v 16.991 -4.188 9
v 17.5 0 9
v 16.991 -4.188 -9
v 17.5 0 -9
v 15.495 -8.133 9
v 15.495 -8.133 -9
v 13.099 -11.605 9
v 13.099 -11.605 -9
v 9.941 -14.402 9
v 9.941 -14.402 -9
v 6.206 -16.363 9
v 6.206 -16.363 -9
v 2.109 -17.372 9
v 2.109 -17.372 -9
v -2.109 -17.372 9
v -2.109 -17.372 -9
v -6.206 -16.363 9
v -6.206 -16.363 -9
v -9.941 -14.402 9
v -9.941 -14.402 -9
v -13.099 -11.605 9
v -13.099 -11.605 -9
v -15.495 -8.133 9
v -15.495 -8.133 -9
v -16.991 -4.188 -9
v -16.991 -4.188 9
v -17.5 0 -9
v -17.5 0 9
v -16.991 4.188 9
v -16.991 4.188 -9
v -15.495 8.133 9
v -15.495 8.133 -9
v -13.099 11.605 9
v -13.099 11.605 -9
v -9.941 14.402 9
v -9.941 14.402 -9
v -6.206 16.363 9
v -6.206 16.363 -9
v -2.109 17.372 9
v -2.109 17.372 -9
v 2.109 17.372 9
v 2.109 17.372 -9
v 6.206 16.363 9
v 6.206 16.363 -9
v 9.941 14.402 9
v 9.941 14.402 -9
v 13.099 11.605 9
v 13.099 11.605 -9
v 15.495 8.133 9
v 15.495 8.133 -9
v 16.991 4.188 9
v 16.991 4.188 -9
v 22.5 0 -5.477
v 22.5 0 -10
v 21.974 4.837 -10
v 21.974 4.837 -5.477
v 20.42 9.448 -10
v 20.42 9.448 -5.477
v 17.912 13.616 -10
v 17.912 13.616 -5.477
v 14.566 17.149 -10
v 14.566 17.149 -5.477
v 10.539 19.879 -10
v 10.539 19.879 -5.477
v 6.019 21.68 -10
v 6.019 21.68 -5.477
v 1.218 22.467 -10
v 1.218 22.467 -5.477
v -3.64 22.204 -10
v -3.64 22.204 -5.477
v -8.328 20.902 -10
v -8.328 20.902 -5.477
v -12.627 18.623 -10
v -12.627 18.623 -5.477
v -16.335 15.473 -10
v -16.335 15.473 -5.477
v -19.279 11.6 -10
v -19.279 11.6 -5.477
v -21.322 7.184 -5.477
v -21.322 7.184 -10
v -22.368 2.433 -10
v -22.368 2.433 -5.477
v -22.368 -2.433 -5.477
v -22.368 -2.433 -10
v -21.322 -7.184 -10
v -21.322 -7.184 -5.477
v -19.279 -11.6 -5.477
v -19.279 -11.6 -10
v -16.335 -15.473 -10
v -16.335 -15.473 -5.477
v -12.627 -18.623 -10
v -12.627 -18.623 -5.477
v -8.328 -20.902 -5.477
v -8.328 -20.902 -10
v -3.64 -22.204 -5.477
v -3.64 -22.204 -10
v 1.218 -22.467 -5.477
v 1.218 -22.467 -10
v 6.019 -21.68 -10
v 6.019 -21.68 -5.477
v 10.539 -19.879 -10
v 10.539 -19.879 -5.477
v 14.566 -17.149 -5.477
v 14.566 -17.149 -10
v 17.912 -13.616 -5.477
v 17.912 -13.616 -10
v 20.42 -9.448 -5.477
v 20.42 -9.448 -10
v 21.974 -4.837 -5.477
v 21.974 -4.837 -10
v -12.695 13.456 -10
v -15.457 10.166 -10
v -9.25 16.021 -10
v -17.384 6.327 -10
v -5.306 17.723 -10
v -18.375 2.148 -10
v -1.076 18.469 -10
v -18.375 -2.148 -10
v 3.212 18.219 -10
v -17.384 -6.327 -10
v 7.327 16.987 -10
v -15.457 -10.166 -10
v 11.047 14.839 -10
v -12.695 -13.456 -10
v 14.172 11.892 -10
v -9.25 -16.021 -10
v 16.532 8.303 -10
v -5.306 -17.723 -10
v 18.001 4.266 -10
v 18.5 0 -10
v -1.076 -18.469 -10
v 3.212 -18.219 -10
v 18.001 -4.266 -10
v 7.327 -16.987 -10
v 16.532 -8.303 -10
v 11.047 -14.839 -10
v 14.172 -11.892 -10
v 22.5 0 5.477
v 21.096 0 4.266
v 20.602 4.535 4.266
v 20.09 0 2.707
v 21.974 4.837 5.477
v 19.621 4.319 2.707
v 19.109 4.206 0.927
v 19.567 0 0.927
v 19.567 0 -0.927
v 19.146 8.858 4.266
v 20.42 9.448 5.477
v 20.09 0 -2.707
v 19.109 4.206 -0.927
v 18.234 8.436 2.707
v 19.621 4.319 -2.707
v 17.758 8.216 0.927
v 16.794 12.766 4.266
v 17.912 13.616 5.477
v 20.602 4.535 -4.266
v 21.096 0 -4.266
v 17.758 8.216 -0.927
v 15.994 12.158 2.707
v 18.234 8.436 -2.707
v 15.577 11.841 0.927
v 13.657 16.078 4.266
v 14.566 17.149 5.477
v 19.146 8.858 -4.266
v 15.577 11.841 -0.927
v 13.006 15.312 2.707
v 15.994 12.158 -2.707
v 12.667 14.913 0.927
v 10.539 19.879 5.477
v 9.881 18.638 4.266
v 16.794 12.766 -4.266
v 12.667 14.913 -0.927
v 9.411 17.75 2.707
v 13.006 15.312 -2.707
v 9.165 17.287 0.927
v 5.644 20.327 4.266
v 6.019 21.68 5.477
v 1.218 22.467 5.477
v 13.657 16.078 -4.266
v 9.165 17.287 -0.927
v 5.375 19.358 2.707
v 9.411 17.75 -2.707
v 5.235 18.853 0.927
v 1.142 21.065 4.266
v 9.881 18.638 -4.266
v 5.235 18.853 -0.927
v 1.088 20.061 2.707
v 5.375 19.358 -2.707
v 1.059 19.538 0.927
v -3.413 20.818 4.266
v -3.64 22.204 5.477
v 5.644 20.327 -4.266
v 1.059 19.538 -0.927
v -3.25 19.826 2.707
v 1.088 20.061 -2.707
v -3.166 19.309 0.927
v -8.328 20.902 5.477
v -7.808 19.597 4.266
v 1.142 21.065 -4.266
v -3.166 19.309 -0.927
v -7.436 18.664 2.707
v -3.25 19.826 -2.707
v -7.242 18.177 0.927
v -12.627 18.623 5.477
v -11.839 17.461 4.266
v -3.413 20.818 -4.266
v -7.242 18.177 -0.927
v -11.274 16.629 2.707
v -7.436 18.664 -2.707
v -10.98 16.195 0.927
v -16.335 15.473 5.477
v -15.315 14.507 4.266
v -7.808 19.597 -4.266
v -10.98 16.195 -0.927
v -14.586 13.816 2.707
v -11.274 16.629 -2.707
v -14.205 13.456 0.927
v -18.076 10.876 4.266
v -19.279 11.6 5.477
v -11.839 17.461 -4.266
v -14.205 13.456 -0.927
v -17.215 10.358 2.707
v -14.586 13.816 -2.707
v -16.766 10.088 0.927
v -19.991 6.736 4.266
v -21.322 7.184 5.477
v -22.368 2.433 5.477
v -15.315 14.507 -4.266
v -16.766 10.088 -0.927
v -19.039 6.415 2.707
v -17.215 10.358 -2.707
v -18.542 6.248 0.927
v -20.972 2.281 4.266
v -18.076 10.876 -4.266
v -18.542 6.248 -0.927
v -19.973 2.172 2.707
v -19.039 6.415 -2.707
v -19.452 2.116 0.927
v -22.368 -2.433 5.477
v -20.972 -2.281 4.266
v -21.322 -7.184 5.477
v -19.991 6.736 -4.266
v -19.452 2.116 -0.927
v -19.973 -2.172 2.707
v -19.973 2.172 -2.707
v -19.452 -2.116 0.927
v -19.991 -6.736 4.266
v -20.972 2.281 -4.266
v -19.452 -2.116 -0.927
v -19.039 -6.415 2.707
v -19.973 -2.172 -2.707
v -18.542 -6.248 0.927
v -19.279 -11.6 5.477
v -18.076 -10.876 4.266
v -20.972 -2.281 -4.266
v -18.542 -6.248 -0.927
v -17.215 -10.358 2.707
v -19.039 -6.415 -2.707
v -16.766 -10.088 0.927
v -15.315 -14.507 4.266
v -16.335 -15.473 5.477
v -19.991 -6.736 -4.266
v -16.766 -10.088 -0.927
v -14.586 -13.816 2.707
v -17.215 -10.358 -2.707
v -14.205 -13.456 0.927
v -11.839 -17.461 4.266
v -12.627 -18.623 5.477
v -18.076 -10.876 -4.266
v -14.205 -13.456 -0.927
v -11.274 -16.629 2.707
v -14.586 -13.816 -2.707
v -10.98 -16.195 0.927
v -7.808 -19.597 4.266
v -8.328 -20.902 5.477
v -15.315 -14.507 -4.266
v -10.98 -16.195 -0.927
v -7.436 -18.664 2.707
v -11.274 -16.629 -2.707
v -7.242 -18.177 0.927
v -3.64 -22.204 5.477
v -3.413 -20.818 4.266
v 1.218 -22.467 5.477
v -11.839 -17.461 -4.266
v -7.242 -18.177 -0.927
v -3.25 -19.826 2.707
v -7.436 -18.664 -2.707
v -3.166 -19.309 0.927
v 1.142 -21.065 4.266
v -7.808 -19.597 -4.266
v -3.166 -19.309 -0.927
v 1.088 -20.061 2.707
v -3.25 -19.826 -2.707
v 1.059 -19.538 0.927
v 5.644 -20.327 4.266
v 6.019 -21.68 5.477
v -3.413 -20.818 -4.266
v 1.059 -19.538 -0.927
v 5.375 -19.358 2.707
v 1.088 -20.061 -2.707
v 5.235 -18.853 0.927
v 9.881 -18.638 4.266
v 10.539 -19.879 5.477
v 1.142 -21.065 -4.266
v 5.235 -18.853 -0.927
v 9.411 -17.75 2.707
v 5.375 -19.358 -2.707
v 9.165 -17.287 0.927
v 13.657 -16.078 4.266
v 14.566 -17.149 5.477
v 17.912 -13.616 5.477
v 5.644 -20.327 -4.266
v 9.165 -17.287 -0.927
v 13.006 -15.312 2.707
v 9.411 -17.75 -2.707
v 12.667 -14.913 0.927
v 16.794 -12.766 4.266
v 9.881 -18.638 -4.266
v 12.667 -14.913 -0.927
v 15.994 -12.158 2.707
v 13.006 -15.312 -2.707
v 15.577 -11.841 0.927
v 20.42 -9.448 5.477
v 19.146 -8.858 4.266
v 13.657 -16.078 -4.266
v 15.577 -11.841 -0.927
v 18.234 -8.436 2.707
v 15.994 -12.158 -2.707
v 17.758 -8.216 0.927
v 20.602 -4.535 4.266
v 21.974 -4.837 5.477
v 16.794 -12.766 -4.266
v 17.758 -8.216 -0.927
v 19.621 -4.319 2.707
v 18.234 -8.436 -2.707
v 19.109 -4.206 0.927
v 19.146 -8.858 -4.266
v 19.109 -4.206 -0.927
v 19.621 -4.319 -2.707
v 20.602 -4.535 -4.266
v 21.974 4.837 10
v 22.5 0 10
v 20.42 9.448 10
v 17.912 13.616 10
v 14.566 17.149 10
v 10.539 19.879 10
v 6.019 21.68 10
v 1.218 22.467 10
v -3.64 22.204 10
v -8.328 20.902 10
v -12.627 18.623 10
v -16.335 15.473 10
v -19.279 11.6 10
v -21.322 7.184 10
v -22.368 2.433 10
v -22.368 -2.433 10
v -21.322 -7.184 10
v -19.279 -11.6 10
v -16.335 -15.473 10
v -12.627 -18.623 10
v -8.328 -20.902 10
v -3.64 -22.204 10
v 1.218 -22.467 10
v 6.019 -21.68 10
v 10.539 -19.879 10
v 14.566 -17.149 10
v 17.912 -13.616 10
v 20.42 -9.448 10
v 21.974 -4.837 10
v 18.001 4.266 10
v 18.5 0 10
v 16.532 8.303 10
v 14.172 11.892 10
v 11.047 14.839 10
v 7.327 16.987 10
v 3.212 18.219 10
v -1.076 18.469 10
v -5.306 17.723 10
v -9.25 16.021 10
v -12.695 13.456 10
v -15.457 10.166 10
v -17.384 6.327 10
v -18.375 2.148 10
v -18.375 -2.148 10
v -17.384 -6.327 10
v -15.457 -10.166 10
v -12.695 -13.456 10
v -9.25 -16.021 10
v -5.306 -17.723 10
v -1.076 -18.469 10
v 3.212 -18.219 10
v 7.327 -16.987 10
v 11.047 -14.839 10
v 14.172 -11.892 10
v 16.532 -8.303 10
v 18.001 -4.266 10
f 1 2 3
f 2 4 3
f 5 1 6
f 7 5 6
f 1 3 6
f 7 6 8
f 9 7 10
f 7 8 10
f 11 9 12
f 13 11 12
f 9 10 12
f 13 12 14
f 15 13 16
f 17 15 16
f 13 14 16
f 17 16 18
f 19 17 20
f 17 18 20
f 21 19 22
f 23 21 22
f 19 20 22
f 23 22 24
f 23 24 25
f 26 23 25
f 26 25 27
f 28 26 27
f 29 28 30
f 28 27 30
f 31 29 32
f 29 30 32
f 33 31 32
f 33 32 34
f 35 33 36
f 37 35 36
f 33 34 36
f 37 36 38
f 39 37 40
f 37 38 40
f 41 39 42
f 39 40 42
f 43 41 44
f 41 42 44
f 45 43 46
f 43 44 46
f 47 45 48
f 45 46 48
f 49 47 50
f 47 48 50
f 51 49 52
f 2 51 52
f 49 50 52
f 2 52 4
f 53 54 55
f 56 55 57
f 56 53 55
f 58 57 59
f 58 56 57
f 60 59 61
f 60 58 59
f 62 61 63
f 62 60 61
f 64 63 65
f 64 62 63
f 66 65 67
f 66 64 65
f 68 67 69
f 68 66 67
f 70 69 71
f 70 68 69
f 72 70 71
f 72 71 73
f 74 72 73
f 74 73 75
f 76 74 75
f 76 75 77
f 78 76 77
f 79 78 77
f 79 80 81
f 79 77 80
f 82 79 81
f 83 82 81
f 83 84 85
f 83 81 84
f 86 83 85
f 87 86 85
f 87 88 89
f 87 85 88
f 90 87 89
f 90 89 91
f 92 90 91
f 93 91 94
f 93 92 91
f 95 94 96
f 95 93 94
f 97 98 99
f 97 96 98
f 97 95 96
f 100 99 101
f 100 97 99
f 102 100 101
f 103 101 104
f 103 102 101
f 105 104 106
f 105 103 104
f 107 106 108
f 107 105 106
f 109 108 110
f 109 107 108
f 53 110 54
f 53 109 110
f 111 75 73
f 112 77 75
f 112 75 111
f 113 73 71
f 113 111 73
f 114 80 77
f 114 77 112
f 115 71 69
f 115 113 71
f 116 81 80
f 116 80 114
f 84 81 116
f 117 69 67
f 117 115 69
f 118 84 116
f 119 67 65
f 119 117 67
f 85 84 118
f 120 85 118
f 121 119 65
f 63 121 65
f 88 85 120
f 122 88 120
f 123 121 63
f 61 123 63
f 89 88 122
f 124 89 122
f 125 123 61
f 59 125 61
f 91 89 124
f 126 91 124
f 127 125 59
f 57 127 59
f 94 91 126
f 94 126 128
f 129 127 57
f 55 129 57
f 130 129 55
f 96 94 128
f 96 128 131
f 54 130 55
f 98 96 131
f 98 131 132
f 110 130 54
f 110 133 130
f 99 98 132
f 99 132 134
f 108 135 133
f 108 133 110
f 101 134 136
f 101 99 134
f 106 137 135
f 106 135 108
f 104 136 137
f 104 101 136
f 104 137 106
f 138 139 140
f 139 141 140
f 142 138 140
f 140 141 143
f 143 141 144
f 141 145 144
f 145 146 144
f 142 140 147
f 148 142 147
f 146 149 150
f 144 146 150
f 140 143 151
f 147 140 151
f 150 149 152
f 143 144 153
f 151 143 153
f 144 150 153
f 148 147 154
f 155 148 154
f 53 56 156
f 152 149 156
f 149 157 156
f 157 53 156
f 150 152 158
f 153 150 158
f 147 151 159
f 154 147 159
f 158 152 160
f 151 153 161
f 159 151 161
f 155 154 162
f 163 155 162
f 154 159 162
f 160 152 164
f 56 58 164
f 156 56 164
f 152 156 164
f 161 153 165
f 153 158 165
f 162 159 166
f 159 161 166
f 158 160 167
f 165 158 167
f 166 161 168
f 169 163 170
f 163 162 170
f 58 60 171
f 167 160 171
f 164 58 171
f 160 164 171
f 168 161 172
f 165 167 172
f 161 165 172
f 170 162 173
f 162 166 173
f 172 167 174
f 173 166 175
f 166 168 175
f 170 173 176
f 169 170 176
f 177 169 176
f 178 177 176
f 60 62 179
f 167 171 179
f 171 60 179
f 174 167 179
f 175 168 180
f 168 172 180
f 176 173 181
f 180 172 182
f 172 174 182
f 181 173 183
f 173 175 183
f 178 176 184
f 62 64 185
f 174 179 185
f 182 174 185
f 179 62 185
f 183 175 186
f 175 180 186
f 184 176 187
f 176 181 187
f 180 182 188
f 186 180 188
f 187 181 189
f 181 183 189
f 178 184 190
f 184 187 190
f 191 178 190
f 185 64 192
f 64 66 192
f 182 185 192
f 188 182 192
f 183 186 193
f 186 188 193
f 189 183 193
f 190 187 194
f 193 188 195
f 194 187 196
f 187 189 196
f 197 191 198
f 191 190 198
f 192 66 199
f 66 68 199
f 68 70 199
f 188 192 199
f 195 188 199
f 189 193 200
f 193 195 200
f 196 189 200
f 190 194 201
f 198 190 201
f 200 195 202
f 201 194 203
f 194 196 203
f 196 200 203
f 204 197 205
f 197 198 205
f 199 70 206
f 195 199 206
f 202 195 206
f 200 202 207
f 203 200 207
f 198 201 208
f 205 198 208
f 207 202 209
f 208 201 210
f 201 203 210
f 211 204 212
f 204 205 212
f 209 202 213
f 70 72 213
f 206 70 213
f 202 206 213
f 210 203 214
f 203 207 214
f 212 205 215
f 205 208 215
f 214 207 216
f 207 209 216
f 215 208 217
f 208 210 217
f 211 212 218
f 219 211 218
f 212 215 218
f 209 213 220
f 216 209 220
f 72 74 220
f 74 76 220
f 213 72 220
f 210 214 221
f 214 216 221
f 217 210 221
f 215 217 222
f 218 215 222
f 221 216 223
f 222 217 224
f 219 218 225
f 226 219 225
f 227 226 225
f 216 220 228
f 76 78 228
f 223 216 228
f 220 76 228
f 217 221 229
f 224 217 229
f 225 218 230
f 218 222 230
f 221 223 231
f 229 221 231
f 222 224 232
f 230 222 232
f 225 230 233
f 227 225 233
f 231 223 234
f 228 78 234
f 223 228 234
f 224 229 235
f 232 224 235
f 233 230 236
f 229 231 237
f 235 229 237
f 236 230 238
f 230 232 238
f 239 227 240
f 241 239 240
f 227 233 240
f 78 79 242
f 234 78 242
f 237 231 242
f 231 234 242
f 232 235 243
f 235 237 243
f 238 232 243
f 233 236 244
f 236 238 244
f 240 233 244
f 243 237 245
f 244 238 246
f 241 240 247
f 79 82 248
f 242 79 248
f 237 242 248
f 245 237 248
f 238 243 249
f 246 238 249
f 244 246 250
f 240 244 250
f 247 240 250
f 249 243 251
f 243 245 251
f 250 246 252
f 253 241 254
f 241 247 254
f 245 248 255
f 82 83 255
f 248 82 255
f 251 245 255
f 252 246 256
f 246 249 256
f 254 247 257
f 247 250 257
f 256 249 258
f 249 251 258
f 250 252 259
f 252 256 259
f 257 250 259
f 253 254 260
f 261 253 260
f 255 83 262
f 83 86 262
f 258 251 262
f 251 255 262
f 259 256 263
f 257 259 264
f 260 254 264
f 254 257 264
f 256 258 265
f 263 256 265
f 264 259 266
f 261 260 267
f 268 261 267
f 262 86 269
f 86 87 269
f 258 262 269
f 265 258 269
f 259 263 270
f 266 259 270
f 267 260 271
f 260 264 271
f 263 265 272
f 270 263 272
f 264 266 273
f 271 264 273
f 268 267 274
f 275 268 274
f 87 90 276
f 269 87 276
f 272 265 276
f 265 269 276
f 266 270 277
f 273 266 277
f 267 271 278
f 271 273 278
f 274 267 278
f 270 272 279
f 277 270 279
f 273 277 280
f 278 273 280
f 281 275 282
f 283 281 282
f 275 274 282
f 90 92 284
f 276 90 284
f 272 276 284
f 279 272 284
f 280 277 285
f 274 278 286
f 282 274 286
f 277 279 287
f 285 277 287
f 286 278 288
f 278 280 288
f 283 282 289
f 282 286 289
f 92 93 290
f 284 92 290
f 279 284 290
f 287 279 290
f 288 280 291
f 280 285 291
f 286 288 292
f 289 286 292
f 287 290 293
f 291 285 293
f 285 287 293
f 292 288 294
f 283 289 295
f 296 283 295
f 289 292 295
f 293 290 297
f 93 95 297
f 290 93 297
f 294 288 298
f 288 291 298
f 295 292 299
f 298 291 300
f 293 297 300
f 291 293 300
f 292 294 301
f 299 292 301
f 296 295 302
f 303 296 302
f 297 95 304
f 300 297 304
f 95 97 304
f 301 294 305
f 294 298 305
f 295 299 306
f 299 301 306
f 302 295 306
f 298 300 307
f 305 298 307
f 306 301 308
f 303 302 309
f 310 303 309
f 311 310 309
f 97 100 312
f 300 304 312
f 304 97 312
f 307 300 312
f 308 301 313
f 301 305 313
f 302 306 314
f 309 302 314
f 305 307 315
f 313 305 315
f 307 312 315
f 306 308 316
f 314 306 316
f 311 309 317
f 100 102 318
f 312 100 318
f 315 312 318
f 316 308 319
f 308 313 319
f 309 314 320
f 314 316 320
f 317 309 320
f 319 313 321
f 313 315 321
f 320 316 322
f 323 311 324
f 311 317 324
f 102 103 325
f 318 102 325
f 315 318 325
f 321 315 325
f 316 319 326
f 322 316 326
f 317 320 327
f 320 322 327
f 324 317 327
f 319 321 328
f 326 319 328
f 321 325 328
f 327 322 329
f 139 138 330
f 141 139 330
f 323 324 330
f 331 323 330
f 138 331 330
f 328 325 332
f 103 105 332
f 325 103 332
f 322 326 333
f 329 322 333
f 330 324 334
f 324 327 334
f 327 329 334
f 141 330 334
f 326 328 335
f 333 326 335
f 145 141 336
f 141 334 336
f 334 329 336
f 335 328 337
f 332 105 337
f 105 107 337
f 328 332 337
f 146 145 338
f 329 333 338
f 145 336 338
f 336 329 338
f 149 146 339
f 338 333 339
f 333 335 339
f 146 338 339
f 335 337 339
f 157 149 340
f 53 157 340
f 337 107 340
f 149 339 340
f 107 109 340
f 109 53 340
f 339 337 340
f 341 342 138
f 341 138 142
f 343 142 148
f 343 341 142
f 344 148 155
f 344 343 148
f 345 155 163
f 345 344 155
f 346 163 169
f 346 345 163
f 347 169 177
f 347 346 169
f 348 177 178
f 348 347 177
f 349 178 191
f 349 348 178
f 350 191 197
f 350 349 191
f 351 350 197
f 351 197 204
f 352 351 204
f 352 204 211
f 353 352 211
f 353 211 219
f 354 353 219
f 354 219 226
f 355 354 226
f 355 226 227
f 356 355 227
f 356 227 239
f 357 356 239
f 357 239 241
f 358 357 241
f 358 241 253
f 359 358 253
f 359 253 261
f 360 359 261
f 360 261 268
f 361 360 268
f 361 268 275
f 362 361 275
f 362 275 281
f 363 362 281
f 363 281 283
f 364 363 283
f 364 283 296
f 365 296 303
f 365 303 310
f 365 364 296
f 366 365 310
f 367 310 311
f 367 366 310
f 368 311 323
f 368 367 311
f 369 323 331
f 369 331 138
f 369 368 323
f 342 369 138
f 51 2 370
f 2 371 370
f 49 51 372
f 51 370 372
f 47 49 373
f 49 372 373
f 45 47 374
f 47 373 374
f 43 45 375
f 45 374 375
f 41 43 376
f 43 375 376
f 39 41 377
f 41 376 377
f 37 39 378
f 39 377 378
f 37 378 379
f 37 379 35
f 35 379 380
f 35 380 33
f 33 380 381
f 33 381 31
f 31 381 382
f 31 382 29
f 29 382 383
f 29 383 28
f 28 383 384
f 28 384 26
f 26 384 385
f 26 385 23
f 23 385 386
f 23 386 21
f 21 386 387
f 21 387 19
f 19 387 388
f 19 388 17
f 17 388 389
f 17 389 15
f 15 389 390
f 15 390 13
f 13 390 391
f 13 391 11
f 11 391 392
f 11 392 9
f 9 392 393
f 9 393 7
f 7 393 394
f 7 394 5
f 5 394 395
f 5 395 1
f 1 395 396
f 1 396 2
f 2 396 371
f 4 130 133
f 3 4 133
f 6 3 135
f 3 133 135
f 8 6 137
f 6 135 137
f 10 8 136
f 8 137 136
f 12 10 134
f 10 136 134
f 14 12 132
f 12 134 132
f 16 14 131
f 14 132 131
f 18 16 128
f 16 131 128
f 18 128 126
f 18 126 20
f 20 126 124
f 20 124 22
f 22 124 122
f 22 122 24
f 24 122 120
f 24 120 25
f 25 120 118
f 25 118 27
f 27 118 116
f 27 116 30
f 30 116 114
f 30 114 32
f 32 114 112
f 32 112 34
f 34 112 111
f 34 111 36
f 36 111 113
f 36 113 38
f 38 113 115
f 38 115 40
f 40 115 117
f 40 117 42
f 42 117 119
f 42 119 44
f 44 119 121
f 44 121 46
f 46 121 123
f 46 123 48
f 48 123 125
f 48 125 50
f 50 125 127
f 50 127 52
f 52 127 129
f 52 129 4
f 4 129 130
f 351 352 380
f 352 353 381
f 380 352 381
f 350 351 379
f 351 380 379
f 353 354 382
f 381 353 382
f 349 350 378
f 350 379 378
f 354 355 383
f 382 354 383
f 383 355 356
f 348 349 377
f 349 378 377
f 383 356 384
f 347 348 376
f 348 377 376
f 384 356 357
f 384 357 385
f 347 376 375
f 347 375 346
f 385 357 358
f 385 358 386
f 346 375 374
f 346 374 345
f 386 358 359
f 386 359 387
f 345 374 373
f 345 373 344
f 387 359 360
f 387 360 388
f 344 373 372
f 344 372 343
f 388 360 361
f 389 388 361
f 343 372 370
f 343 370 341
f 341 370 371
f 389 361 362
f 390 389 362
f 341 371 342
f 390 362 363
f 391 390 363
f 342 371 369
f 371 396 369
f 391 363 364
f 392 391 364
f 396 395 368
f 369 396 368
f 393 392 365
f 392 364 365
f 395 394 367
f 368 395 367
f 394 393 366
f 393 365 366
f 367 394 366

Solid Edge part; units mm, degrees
sketch "Sketch1" plane through (0, 0, 0) normal (0, -1, 0) x (1, 0, 0)
  line L0 (17.5, 10) -> (17.5, -10)
  line L1 (17.5, -10) -> (22.5, -10)
  line L2 (22.5, -10) -> (22.5, 10)
  line L3 (22.5, 10) -> (17.5, 10)
  dimension "D1" = 5
  dimension "D2" = 20
revolve "RevolvedProtrusion1" add sketch "Sketch1" angle 360 about axis through (0, 0, 54) along (0, 0, -1)
chamfer "Chamfer1" distance 1 angle 45 2 edges at (-17.5, 0, 10) (-17.5, 0, -10)
sketch "Sketch2" plane through (0, 0, 0) normal (0, -1, 0) x (1, 0, 0)
  circle A0 centre (26, 0) radius 6.5
  dimension "D1" = 26
revolve "RevolvedCutout1" cut sketch "Sketch2" angle 360 about axis through (0, 0, 54) along (0, 0, -1)
properties material "Polyethylene, low density"
